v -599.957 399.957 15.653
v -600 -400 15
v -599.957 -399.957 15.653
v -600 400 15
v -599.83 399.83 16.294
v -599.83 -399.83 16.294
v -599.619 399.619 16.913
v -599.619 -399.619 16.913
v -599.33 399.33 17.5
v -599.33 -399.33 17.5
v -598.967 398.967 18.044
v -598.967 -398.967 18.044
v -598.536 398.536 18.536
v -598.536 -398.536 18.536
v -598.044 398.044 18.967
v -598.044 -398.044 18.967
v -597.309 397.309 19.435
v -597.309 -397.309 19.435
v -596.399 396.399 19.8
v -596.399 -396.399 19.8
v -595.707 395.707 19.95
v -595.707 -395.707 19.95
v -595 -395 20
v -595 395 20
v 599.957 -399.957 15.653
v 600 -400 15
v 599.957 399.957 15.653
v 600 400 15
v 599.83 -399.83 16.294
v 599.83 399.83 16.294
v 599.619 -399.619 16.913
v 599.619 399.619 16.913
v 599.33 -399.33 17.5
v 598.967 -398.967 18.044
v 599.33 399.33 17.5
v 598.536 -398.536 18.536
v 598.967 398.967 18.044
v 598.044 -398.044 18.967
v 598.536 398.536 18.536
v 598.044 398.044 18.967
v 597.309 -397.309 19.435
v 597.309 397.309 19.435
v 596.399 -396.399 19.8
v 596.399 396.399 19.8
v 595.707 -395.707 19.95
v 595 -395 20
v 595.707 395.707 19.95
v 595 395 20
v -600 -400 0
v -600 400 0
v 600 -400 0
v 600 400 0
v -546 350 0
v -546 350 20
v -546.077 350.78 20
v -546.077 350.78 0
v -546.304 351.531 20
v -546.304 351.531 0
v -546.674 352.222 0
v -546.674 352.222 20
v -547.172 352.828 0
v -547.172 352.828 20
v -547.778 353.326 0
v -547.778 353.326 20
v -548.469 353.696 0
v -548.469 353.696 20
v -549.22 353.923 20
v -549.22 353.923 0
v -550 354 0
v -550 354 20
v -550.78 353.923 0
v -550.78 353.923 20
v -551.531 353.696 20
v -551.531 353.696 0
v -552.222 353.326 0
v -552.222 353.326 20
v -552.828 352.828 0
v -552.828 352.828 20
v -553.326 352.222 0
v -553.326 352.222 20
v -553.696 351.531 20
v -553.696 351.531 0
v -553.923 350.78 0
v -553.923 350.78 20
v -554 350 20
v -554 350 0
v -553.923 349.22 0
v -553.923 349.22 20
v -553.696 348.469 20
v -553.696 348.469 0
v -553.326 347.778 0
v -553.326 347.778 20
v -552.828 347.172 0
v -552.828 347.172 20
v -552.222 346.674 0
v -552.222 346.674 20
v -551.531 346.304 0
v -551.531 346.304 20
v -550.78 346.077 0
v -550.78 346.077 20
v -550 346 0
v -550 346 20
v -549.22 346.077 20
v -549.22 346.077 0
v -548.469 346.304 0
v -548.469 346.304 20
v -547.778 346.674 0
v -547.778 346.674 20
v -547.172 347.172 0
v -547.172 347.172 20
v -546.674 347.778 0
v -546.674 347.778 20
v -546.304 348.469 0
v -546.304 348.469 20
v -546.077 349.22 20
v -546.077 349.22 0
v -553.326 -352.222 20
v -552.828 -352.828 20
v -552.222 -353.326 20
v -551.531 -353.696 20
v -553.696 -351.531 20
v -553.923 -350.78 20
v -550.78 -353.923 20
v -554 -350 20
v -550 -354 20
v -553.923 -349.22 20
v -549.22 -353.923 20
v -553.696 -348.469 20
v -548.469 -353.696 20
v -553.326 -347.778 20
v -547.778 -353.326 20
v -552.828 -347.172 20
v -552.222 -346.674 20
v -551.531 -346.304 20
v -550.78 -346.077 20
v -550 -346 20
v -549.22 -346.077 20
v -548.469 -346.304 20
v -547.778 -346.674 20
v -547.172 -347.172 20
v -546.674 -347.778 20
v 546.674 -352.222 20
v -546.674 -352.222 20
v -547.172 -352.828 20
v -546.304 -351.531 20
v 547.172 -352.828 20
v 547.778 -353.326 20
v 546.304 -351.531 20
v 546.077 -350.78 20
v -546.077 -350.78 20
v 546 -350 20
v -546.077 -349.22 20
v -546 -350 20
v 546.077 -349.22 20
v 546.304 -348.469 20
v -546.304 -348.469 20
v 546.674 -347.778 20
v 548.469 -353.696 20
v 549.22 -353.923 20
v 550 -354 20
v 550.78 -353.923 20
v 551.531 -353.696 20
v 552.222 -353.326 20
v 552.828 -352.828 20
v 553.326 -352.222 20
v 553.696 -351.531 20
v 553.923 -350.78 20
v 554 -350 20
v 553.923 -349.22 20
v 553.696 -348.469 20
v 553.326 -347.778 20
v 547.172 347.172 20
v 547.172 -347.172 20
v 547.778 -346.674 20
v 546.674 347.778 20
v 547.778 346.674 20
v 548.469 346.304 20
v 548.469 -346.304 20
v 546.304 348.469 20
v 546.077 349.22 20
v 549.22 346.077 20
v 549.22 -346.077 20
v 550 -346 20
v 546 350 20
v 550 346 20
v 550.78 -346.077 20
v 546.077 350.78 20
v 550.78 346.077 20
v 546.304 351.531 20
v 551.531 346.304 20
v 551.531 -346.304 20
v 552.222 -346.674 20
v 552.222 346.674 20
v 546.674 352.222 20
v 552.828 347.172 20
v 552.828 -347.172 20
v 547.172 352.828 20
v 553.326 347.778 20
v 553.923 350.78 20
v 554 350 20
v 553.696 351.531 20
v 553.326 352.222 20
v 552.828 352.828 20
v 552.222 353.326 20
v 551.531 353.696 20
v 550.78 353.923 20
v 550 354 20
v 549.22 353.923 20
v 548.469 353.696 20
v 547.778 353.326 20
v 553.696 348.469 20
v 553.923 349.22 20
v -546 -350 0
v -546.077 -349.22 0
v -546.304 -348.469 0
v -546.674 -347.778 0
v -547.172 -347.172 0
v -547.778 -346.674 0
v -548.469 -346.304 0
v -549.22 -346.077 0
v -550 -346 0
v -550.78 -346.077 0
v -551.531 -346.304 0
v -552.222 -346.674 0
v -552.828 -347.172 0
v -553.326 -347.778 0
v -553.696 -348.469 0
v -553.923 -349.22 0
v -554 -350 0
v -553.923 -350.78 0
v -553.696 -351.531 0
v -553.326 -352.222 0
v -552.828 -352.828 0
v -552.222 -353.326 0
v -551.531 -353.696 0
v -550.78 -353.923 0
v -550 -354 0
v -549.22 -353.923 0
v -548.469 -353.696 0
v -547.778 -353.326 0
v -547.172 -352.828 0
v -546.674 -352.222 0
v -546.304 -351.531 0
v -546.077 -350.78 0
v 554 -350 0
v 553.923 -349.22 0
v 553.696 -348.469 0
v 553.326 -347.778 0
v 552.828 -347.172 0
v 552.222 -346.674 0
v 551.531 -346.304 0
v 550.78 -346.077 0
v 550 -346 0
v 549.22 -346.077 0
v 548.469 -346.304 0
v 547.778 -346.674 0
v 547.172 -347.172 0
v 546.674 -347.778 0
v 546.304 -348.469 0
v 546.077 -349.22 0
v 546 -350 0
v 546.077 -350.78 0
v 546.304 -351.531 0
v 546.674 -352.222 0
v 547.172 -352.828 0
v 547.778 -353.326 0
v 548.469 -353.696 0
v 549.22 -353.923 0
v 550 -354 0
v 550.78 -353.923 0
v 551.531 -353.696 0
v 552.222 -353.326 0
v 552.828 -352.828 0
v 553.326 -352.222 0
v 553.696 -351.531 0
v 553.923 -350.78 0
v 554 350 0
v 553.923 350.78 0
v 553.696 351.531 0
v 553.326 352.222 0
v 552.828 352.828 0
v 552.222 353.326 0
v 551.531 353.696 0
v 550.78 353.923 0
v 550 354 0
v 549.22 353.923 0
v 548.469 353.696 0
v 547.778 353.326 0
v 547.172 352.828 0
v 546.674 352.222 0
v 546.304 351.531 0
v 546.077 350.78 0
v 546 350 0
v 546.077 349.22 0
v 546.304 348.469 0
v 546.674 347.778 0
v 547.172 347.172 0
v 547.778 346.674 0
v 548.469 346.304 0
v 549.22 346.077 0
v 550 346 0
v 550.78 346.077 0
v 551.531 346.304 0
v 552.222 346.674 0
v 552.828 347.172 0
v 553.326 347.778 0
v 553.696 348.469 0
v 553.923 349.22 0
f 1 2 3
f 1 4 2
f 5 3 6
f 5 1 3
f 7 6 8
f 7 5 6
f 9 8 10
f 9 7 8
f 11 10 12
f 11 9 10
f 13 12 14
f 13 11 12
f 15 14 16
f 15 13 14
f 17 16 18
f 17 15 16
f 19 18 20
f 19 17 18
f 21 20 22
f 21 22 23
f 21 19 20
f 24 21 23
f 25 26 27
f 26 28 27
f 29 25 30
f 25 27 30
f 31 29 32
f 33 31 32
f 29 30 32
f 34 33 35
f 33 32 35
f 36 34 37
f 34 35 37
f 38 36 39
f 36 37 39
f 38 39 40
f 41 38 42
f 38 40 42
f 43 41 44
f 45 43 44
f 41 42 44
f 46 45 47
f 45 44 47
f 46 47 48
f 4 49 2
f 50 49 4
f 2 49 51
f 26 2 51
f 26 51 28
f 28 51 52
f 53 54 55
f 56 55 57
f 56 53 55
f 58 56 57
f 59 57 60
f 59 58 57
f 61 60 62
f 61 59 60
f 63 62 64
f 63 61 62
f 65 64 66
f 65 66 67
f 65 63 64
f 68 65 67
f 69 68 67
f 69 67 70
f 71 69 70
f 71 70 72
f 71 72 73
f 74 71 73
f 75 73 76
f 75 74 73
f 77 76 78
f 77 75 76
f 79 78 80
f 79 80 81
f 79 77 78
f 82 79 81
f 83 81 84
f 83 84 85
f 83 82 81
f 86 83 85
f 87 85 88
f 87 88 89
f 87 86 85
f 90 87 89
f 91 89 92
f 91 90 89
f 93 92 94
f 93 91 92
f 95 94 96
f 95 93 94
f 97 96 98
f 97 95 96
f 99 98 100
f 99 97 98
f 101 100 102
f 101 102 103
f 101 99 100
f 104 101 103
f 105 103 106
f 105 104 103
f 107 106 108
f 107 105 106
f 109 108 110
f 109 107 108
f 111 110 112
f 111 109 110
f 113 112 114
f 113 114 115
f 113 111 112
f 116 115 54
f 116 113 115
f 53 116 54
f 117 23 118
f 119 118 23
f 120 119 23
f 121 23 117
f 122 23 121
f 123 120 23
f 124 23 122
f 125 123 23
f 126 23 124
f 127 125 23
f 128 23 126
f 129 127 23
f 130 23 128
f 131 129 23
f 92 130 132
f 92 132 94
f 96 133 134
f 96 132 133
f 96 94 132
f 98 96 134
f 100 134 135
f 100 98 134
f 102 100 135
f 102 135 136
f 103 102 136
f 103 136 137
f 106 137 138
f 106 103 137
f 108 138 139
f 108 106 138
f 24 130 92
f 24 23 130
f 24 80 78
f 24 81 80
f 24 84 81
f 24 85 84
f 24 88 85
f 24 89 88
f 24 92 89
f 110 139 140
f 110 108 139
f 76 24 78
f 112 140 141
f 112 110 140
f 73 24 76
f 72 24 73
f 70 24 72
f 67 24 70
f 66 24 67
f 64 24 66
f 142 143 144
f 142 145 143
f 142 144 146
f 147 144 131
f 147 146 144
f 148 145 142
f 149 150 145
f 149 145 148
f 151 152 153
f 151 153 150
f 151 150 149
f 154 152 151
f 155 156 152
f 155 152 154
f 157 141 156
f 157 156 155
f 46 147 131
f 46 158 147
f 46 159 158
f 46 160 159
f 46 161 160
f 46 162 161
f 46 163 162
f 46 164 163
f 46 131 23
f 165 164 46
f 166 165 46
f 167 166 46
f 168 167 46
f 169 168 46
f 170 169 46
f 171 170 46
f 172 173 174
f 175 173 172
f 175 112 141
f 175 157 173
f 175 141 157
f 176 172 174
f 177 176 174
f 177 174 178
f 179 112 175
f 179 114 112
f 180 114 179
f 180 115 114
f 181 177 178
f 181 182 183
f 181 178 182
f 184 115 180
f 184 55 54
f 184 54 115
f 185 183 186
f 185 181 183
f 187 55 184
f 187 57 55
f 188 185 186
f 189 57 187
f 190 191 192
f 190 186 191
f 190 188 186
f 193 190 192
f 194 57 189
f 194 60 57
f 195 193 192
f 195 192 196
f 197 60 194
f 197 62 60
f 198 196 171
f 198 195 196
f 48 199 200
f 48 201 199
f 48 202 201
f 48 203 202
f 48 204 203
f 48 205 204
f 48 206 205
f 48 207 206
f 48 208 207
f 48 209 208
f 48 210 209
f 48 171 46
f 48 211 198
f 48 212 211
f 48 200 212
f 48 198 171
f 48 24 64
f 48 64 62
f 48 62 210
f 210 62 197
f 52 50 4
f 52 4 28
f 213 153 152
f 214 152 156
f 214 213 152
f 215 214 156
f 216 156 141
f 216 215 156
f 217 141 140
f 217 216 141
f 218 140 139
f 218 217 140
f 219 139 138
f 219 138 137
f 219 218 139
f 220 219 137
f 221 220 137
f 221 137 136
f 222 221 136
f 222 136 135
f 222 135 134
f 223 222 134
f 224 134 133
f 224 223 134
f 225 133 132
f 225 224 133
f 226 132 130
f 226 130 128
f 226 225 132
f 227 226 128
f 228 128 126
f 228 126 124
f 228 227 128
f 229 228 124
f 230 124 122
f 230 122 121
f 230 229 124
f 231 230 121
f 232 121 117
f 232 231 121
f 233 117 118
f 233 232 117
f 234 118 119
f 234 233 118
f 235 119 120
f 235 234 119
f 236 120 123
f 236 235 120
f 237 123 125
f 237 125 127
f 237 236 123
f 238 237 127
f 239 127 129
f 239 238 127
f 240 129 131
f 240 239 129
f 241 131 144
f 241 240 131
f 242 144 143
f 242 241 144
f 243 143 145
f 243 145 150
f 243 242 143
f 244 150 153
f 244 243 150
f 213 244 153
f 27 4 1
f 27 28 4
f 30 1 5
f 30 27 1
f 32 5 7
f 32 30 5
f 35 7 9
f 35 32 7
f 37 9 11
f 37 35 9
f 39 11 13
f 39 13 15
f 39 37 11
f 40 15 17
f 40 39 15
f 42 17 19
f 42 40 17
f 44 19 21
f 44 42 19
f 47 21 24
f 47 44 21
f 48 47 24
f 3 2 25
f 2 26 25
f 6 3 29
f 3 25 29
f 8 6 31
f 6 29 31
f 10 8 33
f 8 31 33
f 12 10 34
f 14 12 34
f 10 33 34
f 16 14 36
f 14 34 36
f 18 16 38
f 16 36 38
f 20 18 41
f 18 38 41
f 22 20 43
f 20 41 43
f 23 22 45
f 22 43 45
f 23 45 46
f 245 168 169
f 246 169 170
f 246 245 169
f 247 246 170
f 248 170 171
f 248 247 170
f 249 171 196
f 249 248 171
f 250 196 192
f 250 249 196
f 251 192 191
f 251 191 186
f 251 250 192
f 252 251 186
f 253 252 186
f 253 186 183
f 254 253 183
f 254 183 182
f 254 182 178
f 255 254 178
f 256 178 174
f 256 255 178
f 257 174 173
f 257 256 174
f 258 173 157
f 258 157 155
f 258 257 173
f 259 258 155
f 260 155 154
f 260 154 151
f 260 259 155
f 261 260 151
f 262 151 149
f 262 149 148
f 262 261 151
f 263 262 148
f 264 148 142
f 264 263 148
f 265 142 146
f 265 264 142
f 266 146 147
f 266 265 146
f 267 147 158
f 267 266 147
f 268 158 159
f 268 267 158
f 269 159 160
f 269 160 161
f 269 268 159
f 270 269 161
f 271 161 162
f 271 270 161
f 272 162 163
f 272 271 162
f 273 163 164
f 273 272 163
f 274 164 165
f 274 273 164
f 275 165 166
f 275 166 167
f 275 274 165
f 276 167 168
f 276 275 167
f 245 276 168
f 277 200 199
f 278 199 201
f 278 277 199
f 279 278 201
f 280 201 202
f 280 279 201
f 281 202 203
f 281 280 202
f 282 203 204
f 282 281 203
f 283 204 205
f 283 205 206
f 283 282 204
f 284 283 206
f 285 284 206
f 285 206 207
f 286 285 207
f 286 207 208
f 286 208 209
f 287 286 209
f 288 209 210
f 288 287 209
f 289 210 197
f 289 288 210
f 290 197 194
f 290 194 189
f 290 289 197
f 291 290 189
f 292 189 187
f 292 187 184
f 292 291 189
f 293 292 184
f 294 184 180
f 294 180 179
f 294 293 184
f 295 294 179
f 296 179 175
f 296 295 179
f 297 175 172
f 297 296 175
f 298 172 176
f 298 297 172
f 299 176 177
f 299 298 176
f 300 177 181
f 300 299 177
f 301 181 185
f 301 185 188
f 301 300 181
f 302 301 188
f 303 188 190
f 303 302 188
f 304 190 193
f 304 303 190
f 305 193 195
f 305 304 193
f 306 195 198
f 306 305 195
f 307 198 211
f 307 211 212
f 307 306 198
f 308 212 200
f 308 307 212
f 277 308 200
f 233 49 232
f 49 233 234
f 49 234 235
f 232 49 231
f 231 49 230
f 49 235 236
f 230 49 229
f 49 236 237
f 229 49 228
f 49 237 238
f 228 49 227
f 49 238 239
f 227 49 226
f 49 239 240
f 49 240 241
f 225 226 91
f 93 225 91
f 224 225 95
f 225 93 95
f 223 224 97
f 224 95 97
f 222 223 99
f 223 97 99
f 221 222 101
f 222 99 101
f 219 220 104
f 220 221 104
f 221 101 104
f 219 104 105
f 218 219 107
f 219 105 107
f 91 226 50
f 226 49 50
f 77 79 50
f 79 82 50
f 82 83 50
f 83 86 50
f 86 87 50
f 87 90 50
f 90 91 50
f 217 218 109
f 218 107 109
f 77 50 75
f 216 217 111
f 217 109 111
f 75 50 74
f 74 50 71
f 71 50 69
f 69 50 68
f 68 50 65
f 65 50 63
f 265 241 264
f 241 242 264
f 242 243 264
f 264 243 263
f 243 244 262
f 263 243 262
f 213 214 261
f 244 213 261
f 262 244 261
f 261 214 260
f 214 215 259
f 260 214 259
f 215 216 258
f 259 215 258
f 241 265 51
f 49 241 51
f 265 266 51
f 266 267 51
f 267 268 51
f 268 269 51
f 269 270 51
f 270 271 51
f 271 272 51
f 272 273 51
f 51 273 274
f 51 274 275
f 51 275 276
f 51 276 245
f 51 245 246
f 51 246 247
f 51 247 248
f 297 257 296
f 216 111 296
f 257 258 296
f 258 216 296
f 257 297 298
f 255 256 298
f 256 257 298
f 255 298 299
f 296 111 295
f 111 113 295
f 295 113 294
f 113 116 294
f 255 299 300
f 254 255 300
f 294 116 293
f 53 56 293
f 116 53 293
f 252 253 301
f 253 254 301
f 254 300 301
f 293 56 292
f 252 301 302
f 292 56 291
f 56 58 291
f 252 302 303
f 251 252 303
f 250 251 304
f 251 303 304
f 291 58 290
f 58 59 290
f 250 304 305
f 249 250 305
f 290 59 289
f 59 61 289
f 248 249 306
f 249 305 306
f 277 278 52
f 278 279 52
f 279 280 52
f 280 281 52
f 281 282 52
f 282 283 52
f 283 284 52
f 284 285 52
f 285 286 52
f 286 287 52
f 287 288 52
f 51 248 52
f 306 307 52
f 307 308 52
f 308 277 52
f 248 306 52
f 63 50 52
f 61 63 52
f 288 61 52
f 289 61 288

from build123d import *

# Parameters (mm, degrees)
SKETCH1_W           = 1200
SKETCH1_H           = 800
BOSS_EXTRUDE1_DEPTH = 20
FILLET1_R           = 5
SKETCH2_R           = 4
CUT_EXTRUDE1_DEPTH  = 20
SKETCH3_R           = 4
CUT_EXTRUDE2_DEPTH  = 20
SKETCH4_R           = 4
CUT_EXTRUDE3_DEPTH  = 20
SKETCH5_R           = 4
CUT_EXTRUDE4_DEPTH  = 20


with BuildPart() as part:
    # Sketch1 → Boss-Extrude1 (new body)
    with BuildSketch(Plane.XY):
        Rectangle(SKETCH1_W, SKETCH1_H)
    extrude(amount=BOSS_EXTRUDE1_DEPTH)

    # Fillet1
    fillet1_edges = [part.edges().sort_by_distance(p)[0] for p in [
        (-600, 0, 20),
        (0, -400, 20),
        (600, 0, 20),
        (0, 400, 20),
    ]]
    fillet(fillet1_edges, radius=FILLET1_R)

    # Sketch2 → Cut-Extrude1 (cut)
    with BuildSketch(Plane.XY):
        with Locations((550, 350)):
            Circle(SKETCH2_R)
    extrude(amount=CUT_EXTRUDE1_DEPTH, mode=Mode.SUBTRACT)

    # Sketch3 → Cut-Extrude2 (cut)
    with BuildSketch(Plane.XY):
        with Locations((550, -350)):
            Circle(SKETCH3_R)
    extrude(amount=CUT_EXTRUDE2_DEPTH, mode=Mode.SUBTRACT)

    # Sketch4 → Cut-Extrude3 (cut)
    with BuildSketch(Plane.XY):
        with Locations((-550, 350)):
            Circle(SKETCH4_R)
    extrude(amount=CUT_EXTRUDE3_DEPTH, mode=Mode.SUBTRACT)

    # Sketch5 → Cut-Extrude4 (cut)
    with BuildSketch(Plane.XY):
        with Locations((-550, -350)):
            Circle(SKETCH5_R)
    extrude(amount=CUT_EXTRUDE4_DEPTH, mode=Mode.SUBTRACT)


solid = part.part
